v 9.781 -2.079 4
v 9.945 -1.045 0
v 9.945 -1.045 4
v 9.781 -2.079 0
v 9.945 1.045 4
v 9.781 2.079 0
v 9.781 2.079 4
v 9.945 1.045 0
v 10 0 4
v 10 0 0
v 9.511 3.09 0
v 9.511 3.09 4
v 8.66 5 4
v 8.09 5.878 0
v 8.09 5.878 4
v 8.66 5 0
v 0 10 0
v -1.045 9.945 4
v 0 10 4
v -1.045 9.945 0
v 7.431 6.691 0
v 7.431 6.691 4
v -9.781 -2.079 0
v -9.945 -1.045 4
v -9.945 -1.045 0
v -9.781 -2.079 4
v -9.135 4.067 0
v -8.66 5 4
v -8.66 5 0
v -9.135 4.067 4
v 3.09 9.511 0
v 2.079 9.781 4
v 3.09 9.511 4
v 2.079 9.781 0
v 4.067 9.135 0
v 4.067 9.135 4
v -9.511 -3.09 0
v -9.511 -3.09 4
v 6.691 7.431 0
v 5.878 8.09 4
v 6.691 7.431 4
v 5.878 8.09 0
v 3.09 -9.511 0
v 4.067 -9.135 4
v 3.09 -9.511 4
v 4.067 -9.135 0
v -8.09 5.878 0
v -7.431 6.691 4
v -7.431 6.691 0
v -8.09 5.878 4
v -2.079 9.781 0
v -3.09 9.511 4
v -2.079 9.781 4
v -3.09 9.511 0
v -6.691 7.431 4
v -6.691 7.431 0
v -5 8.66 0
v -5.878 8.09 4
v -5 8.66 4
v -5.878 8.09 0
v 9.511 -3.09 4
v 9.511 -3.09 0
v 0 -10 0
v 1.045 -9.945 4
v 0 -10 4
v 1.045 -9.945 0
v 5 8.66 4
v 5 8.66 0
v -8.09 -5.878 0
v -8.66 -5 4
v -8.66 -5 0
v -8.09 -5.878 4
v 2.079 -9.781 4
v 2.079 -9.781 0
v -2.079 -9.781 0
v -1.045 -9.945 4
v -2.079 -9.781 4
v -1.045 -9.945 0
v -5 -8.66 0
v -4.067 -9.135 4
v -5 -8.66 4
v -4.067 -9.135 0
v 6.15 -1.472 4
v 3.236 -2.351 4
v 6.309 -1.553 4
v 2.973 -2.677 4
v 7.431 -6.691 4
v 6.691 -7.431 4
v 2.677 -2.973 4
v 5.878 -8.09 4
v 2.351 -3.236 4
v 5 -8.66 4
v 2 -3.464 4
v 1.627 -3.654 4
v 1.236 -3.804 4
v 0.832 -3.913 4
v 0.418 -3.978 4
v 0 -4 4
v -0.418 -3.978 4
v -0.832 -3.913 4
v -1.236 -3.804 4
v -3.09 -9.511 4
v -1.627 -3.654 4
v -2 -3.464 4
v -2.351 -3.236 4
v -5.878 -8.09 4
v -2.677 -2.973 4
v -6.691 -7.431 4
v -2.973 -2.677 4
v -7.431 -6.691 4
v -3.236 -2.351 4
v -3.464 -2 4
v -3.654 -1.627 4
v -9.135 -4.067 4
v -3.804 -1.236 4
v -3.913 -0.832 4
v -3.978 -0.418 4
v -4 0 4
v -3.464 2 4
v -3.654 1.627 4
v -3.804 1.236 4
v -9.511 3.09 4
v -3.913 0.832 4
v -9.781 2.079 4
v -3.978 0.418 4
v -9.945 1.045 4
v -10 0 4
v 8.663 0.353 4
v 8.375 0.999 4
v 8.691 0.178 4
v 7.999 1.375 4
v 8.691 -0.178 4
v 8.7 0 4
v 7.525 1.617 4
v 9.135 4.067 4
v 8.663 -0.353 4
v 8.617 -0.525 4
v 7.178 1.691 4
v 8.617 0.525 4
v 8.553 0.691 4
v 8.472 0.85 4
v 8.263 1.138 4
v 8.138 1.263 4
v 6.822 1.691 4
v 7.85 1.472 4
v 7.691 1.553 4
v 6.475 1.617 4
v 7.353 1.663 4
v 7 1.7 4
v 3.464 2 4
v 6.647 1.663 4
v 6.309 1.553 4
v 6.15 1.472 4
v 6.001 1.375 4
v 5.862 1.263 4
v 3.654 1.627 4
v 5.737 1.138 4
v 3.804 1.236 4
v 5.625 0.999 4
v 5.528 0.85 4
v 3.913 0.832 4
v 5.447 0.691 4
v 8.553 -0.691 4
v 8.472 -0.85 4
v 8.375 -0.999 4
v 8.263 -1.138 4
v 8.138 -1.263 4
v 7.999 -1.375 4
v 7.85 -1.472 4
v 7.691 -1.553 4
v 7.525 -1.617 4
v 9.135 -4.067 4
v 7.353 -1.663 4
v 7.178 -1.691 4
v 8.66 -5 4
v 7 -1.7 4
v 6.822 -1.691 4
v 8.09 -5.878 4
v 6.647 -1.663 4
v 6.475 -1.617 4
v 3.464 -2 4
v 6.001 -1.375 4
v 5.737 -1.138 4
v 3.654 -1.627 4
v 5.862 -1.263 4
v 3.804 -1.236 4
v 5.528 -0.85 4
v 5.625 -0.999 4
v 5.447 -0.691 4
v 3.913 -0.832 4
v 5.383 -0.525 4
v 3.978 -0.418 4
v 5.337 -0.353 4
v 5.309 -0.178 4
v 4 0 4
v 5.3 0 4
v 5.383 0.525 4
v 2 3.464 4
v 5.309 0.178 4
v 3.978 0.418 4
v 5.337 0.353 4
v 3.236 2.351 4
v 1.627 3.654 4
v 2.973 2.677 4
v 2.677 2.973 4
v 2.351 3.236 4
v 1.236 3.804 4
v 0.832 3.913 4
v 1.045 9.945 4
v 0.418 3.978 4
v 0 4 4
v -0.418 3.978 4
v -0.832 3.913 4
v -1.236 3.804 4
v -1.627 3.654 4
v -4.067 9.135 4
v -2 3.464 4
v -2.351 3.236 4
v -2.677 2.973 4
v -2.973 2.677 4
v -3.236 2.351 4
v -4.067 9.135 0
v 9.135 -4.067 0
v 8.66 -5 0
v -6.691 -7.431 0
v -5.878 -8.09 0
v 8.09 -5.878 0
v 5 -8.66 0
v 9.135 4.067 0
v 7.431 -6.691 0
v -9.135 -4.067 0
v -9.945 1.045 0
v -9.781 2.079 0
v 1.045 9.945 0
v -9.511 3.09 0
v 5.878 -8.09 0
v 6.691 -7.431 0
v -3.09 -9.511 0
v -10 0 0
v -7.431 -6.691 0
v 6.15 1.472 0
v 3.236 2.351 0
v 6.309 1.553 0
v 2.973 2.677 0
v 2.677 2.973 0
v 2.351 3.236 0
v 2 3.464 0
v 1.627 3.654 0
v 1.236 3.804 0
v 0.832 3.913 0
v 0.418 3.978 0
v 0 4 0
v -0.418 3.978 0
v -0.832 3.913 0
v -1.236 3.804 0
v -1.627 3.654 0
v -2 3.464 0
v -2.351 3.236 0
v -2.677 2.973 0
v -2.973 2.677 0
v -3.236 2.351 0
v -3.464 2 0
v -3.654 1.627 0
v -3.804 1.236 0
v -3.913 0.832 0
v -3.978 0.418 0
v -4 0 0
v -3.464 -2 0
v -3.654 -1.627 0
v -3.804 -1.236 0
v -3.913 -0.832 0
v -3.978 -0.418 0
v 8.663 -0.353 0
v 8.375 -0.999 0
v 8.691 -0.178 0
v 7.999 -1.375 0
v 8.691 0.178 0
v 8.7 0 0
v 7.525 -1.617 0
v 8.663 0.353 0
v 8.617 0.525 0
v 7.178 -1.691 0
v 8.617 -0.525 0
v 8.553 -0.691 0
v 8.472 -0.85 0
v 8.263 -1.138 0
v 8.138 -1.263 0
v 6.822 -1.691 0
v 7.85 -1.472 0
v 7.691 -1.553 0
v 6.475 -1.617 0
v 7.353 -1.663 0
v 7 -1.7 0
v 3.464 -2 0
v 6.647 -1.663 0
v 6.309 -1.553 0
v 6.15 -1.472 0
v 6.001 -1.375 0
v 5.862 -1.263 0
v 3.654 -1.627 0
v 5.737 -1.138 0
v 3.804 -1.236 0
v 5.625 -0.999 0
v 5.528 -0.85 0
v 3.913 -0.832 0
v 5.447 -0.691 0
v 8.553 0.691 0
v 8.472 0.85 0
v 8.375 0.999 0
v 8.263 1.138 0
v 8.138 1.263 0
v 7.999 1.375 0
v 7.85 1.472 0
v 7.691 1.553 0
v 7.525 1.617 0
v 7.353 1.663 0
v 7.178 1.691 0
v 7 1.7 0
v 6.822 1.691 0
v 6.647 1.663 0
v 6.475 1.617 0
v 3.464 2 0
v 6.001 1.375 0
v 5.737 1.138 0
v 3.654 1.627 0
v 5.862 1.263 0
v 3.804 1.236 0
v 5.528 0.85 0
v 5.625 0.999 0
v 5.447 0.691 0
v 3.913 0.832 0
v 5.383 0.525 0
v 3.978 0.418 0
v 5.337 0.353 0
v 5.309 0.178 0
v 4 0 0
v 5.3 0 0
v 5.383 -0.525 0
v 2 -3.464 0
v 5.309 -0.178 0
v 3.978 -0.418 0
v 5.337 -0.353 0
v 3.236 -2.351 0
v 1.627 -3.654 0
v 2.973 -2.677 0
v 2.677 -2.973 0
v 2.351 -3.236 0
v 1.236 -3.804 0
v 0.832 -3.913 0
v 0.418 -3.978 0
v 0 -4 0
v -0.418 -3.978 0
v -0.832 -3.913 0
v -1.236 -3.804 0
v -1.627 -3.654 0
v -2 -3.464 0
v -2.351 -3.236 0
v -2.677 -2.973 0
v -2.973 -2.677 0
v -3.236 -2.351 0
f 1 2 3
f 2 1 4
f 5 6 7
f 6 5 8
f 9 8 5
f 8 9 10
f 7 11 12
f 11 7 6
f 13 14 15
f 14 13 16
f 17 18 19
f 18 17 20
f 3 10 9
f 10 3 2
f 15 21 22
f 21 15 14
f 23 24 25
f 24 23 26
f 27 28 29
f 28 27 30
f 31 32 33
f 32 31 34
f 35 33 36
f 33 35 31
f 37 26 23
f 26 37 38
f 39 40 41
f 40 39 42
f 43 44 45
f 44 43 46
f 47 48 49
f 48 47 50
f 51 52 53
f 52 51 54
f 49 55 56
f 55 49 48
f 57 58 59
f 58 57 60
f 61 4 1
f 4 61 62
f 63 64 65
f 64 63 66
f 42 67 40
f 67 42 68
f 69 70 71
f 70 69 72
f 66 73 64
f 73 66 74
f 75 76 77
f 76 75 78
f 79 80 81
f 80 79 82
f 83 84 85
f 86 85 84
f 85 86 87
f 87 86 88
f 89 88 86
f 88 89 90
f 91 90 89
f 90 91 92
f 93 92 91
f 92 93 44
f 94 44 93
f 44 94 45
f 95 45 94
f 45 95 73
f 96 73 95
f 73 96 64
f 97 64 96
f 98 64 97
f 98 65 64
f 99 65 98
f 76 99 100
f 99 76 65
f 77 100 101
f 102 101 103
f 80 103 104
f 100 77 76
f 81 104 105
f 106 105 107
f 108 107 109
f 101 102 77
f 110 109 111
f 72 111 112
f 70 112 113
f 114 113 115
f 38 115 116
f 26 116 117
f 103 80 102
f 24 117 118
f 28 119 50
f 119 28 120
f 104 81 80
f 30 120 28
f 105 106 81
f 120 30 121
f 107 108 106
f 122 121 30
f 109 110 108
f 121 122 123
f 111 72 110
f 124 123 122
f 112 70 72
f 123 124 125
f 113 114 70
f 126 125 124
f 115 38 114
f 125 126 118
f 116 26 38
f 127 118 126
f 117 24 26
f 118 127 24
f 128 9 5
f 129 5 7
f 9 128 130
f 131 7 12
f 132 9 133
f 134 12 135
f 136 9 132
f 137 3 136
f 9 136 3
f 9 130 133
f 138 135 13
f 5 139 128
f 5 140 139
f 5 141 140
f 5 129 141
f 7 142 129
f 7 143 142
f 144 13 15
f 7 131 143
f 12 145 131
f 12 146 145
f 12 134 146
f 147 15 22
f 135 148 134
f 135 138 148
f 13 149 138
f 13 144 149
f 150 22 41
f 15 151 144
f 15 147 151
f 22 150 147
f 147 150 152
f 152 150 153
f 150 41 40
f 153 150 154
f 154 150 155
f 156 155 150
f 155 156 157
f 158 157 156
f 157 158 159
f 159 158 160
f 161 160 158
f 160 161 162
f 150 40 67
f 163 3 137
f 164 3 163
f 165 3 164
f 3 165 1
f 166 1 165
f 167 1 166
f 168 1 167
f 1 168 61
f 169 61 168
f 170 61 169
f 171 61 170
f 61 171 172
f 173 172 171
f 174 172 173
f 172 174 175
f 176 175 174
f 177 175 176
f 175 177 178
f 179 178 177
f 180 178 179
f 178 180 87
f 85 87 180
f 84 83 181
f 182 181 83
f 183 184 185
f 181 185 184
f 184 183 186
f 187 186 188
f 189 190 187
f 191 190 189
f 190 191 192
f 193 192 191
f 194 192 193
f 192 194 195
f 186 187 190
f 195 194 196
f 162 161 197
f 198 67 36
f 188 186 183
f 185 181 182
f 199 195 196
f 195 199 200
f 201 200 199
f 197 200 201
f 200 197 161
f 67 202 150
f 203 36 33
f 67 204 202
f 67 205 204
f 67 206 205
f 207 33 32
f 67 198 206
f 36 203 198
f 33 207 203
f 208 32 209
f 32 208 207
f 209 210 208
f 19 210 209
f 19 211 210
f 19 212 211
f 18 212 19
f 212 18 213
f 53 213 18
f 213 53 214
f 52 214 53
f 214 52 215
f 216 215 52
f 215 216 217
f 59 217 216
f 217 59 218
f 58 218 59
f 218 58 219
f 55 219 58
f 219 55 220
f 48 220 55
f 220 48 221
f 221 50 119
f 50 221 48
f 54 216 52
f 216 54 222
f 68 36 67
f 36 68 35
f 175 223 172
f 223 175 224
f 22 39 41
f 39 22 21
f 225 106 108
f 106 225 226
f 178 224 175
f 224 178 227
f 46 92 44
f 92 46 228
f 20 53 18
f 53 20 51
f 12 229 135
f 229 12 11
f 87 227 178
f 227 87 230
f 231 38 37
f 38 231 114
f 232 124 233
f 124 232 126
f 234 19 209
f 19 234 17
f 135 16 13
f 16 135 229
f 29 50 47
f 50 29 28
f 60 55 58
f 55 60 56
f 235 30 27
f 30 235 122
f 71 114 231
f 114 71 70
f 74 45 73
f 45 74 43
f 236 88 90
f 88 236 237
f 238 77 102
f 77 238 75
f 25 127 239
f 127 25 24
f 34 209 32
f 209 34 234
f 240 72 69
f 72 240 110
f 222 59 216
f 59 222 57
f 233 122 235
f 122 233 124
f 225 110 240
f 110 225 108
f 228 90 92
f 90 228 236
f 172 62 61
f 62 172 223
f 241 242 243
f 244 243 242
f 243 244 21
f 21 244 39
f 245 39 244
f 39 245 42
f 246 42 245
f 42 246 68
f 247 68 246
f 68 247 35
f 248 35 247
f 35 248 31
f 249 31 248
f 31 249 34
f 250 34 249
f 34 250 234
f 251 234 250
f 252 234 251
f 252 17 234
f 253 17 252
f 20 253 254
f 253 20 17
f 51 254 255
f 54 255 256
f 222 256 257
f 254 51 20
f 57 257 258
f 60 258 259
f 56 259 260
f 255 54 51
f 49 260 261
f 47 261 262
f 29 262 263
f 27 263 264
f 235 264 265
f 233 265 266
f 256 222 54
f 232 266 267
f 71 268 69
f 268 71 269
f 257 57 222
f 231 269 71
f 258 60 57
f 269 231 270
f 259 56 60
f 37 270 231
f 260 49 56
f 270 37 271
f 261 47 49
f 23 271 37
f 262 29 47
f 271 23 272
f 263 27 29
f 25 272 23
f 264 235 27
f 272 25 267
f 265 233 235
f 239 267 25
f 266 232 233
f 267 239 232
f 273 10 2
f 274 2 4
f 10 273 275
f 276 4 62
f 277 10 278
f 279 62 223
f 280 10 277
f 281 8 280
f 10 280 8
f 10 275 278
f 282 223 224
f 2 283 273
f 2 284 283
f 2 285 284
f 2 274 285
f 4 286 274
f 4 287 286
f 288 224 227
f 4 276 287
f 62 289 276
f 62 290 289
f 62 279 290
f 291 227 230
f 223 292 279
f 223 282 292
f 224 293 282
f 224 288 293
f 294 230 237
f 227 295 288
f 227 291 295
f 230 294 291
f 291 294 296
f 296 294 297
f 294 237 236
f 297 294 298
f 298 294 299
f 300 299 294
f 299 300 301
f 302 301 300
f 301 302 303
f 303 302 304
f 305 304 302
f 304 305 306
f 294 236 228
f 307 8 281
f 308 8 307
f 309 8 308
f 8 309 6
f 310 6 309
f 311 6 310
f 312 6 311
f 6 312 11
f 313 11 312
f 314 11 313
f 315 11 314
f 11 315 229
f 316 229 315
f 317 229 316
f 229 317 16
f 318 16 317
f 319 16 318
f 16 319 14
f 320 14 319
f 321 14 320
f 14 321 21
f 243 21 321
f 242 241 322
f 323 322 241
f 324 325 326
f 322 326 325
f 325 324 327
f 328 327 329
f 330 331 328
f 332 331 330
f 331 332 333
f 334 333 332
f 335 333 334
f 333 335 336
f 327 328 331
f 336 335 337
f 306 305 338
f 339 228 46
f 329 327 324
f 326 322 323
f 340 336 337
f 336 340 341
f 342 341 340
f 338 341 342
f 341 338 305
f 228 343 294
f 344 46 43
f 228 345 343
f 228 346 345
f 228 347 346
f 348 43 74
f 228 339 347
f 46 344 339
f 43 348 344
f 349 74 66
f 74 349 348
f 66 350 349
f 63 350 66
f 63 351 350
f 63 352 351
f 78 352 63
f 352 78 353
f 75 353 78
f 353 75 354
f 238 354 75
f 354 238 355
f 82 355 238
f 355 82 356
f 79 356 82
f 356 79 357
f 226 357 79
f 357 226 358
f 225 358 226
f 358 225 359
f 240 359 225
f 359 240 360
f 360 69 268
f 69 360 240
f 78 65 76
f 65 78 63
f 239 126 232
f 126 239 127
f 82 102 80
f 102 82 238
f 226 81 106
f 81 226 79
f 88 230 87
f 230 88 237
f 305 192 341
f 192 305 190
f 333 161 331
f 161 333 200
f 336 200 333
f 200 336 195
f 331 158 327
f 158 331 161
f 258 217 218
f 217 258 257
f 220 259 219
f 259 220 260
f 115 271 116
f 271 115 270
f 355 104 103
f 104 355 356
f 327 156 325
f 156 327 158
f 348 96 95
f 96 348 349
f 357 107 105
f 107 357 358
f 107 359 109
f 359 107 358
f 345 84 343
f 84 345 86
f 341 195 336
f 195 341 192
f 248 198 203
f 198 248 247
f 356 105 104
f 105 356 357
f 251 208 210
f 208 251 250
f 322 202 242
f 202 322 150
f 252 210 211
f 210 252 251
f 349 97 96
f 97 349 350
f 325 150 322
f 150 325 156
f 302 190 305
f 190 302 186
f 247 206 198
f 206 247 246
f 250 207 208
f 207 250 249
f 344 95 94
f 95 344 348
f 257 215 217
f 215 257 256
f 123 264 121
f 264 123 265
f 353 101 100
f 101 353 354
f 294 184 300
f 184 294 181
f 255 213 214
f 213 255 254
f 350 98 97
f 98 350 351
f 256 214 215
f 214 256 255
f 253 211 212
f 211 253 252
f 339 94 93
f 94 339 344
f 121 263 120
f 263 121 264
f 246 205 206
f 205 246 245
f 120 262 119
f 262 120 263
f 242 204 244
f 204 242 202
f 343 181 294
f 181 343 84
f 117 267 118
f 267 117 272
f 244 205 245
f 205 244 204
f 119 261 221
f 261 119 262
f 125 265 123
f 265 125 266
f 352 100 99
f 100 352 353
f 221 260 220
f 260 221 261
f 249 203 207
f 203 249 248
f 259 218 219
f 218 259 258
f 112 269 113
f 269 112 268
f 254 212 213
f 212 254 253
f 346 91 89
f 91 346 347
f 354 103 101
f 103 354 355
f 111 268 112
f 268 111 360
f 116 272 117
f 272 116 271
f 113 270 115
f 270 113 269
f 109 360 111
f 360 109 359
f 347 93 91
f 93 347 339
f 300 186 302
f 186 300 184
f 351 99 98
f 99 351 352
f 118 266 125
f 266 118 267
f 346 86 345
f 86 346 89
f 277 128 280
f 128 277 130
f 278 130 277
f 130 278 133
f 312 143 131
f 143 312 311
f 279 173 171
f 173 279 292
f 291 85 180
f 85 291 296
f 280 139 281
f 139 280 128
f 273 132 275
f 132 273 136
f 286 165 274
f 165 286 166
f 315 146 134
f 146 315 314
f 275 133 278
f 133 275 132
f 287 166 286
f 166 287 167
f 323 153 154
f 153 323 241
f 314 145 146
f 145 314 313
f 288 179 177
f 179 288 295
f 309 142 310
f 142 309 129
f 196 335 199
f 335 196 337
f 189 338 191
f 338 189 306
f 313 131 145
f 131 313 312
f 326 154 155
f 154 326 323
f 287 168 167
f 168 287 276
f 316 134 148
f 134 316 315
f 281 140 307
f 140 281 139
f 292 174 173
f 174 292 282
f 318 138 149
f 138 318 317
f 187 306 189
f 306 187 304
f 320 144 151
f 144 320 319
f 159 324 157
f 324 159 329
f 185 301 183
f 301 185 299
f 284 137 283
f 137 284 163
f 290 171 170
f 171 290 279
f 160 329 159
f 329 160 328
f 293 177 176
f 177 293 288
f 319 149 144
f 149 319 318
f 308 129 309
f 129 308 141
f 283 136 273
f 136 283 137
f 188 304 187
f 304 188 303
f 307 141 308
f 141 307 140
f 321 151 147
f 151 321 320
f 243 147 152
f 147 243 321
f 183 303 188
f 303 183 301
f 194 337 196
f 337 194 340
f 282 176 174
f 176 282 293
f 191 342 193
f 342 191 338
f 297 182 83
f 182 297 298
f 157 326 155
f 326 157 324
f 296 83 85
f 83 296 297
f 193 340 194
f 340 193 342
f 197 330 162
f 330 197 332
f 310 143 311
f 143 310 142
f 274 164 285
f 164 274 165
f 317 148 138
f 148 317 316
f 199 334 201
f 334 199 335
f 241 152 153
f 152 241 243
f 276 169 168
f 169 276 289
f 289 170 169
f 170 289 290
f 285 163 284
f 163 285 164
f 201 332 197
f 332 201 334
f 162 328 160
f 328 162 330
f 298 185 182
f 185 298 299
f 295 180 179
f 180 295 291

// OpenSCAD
// Closed cable guide ring.
$fn = 60;
eps = 0.02;
cable_d = 8;
outer_d = 20;
thickness = 4;
difference() { cylinder(d=outer_d,h=thickness); translate([0,0,-eps]) cylinder(d=cable_d,h=thickness+2*eps); translate([outer_d/2-3,0,-eps]) cylinder(d=3.4,h=thickness+2*eps); }
